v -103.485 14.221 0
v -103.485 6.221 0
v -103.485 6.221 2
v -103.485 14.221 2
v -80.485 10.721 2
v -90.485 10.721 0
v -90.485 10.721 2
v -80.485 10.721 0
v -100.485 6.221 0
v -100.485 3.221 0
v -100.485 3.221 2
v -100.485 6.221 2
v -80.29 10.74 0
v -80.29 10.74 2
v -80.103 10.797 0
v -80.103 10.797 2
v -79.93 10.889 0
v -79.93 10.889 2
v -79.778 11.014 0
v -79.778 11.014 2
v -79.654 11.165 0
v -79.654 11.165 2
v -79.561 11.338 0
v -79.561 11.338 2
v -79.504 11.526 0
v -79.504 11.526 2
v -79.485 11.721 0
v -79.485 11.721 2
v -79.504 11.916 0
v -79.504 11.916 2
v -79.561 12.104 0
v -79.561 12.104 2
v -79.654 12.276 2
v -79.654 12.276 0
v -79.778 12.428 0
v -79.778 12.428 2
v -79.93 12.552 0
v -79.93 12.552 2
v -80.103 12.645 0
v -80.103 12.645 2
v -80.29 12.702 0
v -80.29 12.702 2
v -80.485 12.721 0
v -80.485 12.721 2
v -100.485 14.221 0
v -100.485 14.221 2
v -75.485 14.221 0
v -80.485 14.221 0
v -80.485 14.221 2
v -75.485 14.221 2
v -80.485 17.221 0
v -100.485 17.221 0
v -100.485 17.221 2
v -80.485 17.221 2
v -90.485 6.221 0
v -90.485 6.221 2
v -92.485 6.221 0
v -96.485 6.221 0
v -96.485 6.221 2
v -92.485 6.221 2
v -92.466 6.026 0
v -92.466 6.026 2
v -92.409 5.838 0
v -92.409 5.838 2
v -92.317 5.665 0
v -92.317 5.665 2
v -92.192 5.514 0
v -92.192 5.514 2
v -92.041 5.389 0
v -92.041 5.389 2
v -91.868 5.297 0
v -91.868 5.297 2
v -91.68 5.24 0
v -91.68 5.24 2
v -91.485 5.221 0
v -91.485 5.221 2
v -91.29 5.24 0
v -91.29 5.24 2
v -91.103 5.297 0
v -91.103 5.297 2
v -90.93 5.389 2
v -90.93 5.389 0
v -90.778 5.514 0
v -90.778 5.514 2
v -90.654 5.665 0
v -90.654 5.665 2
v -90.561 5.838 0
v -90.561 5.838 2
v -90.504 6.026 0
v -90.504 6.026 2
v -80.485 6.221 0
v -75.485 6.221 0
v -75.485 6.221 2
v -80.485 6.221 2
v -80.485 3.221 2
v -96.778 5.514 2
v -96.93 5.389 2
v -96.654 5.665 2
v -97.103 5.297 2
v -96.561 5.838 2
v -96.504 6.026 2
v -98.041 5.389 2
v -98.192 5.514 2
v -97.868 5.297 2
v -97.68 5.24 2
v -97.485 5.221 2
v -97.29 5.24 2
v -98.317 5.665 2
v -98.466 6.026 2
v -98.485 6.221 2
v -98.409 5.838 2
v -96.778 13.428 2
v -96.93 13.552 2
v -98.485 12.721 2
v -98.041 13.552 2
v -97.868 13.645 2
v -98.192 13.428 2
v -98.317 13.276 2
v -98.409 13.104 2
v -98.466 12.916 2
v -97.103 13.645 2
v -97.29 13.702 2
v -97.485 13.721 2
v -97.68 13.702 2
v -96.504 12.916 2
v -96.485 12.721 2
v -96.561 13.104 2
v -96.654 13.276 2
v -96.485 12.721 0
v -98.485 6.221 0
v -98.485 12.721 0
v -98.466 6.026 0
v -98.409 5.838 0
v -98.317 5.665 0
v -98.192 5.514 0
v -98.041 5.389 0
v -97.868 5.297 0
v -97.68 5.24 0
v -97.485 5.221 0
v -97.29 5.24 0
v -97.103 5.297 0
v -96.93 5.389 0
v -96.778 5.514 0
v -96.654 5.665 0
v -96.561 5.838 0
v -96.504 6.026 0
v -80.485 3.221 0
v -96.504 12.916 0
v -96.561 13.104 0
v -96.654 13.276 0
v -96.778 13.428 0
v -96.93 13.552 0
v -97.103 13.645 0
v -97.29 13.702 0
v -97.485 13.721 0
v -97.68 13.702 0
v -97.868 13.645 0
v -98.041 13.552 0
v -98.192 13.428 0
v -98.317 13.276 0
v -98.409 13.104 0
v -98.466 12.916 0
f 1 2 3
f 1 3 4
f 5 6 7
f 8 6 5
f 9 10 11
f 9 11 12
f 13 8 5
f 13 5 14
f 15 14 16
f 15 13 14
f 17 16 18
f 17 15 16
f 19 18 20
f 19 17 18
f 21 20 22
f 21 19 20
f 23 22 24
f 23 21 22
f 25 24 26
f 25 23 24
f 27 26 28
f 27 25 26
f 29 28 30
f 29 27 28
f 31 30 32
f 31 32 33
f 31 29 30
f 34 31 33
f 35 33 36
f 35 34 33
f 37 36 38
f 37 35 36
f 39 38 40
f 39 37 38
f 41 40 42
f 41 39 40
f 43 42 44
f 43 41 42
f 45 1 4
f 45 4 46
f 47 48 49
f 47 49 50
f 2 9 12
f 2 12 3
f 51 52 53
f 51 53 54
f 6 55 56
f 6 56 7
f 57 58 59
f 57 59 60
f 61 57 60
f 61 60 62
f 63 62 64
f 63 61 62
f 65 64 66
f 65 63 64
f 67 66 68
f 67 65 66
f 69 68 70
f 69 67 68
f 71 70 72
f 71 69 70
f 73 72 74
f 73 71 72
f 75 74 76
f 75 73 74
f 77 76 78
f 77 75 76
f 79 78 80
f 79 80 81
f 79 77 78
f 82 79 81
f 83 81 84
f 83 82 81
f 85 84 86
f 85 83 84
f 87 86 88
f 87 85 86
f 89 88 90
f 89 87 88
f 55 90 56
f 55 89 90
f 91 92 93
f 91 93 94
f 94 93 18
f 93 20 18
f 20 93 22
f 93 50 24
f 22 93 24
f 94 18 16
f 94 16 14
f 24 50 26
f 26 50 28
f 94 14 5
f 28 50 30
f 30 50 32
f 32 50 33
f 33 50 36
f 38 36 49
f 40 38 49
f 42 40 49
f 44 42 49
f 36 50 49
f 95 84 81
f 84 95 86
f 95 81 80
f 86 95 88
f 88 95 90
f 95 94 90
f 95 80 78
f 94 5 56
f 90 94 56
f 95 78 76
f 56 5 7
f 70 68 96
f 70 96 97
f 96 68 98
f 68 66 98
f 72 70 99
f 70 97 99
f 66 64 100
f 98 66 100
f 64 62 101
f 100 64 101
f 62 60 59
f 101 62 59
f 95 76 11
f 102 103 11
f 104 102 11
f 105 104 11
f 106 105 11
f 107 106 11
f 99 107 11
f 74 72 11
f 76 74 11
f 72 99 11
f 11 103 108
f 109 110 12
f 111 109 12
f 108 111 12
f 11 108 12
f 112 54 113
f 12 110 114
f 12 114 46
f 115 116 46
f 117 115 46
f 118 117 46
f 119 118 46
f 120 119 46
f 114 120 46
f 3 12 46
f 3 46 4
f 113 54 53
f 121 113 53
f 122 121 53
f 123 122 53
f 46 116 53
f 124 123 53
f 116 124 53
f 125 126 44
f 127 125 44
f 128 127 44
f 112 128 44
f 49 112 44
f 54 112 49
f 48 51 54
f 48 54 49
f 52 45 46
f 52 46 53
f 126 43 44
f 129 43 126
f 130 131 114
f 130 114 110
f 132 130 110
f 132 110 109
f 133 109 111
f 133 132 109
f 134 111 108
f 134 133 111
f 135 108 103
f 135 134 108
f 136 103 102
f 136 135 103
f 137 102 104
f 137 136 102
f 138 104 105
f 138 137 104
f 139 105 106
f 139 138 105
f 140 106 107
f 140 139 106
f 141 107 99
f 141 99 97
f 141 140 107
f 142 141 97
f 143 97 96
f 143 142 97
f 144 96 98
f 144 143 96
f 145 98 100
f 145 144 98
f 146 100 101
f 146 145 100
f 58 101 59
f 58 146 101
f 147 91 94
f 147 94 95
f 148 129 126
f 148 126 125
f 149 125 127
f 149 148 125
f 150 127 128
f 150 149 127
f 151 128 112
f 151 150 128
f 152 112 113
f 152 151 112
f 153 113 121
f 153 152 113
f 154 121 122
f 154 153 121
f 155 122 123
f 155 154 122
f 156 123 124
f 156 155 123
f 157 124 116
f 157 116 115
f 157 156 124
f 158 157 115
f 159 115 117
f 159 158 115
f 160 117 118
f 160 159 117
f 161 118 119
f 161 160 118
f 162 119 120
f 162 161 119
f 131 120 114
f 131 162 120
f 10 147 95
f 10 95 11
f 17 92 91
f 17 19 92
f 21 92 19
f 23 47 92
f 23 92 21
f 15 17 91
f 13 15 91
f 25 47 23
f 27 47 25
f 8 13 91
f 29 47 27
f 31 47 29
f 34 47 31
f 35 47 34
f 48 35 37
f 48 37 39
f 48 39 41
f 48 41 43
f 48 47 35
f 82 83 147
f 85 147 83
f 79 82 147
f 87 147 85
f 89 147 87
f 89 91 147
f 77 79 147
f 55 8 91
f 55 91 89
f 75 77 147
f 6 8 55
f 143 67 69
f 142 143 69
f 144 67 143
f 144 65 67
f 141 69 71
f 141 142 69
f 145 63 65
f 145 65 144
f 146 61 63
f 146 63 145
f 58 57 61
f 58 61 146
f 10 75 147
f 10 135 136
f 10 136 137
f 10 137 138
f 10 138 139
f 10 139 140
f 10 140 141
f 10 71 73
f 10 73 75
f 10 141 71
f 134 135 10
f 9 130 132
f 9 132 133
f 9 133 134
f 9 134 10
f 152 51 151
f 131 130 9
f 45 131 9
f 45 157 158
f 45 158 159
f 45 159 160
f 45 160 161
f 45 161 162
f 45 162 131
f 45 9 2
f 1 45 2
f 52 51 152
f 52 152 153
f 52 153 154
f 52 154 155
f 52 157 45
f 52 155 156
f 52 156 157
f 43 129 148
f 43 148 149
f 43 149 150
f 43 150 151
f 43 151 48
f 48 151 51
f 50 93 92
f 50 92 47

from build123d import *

# Parameters (mm, degrees)
BOSS_EXTRUDE1_DEPTH = 2
SKETCH3_W           = 5
SKETCH3_H           = 8
CUT_EXTRUDE1_DEPTH  = 2


with BuildPart() as part:
    # Sketch2 → Boss-Extrude1 (new body)
    with BuildSketch(Plane.XY):
        Polygon((-100.485199734, 17.220891199), (-80.485199734, 17.220891199), (-80.485199734, 14.220891199), (-70.485199734, 14.220891199), (-70.485199734, 6.220891199), (-80.485199734, 6.220891199), (-80.485199734, 3.220891199), (-100.485199734, 3.220891199), (-100.485199734, 6.220891199), (-103.485199734, 6.220891199), (-103.485199734, 14.220891199), (-100.485199734, 14.220891199), align=None)
        with BuildLine():
            Line((-90.485199734, 10.720891199), (-80.485199734, 10.720891199))
            ThreePointArc((-80.485199734, 10.720891199), (-79.485199734, 11.720891199), (-80.485199734, 12.720891199))
            Line((-80.485199734, 12.720891199), (-96.485199734, 12.720891199))
            ThreePointArc((-96.485199734, 12.720891199), (-97.485199734, 13.720891199), (-98.485199734, 12.720891199))
            Line((-98.485199734, 12.720891199), (-98.485199734, 6.220891199))
            ThreePointArc((-98.485199734, 6.220891199), (-97.485199734, 5.220891199), (-96.485199734, 6.220891199))
            Line((-96.485199734, 6.220891199), (-92.485199734, 6.220891199))
            ThreePointArc((-92.485199734, 6.220891199), (-91.485199734, 5.220891199), (-90.485199734, 6.220891199))
            Line((-90.485199734, 6.220891199), (-90.485199734, 10.720891199))
        make_face(mode=Mode.SUBTRACT)
    extrude(amount=BOSS_EXTRUDE1_DEPTH)

    # Sketch3 → Cut-Extrude1 (cut)
    with BuildSketch(Plane.XY.offset(2)):
        with Locations((-72.985199734, 10.220891199)):
            Rectangle(SKETCH3_W, SKETCH3_H)
    extrude(amount=-CUT_EXTRUDE1_DEPTH, mode=Mode.SUBTRACT)


solid = part.part
